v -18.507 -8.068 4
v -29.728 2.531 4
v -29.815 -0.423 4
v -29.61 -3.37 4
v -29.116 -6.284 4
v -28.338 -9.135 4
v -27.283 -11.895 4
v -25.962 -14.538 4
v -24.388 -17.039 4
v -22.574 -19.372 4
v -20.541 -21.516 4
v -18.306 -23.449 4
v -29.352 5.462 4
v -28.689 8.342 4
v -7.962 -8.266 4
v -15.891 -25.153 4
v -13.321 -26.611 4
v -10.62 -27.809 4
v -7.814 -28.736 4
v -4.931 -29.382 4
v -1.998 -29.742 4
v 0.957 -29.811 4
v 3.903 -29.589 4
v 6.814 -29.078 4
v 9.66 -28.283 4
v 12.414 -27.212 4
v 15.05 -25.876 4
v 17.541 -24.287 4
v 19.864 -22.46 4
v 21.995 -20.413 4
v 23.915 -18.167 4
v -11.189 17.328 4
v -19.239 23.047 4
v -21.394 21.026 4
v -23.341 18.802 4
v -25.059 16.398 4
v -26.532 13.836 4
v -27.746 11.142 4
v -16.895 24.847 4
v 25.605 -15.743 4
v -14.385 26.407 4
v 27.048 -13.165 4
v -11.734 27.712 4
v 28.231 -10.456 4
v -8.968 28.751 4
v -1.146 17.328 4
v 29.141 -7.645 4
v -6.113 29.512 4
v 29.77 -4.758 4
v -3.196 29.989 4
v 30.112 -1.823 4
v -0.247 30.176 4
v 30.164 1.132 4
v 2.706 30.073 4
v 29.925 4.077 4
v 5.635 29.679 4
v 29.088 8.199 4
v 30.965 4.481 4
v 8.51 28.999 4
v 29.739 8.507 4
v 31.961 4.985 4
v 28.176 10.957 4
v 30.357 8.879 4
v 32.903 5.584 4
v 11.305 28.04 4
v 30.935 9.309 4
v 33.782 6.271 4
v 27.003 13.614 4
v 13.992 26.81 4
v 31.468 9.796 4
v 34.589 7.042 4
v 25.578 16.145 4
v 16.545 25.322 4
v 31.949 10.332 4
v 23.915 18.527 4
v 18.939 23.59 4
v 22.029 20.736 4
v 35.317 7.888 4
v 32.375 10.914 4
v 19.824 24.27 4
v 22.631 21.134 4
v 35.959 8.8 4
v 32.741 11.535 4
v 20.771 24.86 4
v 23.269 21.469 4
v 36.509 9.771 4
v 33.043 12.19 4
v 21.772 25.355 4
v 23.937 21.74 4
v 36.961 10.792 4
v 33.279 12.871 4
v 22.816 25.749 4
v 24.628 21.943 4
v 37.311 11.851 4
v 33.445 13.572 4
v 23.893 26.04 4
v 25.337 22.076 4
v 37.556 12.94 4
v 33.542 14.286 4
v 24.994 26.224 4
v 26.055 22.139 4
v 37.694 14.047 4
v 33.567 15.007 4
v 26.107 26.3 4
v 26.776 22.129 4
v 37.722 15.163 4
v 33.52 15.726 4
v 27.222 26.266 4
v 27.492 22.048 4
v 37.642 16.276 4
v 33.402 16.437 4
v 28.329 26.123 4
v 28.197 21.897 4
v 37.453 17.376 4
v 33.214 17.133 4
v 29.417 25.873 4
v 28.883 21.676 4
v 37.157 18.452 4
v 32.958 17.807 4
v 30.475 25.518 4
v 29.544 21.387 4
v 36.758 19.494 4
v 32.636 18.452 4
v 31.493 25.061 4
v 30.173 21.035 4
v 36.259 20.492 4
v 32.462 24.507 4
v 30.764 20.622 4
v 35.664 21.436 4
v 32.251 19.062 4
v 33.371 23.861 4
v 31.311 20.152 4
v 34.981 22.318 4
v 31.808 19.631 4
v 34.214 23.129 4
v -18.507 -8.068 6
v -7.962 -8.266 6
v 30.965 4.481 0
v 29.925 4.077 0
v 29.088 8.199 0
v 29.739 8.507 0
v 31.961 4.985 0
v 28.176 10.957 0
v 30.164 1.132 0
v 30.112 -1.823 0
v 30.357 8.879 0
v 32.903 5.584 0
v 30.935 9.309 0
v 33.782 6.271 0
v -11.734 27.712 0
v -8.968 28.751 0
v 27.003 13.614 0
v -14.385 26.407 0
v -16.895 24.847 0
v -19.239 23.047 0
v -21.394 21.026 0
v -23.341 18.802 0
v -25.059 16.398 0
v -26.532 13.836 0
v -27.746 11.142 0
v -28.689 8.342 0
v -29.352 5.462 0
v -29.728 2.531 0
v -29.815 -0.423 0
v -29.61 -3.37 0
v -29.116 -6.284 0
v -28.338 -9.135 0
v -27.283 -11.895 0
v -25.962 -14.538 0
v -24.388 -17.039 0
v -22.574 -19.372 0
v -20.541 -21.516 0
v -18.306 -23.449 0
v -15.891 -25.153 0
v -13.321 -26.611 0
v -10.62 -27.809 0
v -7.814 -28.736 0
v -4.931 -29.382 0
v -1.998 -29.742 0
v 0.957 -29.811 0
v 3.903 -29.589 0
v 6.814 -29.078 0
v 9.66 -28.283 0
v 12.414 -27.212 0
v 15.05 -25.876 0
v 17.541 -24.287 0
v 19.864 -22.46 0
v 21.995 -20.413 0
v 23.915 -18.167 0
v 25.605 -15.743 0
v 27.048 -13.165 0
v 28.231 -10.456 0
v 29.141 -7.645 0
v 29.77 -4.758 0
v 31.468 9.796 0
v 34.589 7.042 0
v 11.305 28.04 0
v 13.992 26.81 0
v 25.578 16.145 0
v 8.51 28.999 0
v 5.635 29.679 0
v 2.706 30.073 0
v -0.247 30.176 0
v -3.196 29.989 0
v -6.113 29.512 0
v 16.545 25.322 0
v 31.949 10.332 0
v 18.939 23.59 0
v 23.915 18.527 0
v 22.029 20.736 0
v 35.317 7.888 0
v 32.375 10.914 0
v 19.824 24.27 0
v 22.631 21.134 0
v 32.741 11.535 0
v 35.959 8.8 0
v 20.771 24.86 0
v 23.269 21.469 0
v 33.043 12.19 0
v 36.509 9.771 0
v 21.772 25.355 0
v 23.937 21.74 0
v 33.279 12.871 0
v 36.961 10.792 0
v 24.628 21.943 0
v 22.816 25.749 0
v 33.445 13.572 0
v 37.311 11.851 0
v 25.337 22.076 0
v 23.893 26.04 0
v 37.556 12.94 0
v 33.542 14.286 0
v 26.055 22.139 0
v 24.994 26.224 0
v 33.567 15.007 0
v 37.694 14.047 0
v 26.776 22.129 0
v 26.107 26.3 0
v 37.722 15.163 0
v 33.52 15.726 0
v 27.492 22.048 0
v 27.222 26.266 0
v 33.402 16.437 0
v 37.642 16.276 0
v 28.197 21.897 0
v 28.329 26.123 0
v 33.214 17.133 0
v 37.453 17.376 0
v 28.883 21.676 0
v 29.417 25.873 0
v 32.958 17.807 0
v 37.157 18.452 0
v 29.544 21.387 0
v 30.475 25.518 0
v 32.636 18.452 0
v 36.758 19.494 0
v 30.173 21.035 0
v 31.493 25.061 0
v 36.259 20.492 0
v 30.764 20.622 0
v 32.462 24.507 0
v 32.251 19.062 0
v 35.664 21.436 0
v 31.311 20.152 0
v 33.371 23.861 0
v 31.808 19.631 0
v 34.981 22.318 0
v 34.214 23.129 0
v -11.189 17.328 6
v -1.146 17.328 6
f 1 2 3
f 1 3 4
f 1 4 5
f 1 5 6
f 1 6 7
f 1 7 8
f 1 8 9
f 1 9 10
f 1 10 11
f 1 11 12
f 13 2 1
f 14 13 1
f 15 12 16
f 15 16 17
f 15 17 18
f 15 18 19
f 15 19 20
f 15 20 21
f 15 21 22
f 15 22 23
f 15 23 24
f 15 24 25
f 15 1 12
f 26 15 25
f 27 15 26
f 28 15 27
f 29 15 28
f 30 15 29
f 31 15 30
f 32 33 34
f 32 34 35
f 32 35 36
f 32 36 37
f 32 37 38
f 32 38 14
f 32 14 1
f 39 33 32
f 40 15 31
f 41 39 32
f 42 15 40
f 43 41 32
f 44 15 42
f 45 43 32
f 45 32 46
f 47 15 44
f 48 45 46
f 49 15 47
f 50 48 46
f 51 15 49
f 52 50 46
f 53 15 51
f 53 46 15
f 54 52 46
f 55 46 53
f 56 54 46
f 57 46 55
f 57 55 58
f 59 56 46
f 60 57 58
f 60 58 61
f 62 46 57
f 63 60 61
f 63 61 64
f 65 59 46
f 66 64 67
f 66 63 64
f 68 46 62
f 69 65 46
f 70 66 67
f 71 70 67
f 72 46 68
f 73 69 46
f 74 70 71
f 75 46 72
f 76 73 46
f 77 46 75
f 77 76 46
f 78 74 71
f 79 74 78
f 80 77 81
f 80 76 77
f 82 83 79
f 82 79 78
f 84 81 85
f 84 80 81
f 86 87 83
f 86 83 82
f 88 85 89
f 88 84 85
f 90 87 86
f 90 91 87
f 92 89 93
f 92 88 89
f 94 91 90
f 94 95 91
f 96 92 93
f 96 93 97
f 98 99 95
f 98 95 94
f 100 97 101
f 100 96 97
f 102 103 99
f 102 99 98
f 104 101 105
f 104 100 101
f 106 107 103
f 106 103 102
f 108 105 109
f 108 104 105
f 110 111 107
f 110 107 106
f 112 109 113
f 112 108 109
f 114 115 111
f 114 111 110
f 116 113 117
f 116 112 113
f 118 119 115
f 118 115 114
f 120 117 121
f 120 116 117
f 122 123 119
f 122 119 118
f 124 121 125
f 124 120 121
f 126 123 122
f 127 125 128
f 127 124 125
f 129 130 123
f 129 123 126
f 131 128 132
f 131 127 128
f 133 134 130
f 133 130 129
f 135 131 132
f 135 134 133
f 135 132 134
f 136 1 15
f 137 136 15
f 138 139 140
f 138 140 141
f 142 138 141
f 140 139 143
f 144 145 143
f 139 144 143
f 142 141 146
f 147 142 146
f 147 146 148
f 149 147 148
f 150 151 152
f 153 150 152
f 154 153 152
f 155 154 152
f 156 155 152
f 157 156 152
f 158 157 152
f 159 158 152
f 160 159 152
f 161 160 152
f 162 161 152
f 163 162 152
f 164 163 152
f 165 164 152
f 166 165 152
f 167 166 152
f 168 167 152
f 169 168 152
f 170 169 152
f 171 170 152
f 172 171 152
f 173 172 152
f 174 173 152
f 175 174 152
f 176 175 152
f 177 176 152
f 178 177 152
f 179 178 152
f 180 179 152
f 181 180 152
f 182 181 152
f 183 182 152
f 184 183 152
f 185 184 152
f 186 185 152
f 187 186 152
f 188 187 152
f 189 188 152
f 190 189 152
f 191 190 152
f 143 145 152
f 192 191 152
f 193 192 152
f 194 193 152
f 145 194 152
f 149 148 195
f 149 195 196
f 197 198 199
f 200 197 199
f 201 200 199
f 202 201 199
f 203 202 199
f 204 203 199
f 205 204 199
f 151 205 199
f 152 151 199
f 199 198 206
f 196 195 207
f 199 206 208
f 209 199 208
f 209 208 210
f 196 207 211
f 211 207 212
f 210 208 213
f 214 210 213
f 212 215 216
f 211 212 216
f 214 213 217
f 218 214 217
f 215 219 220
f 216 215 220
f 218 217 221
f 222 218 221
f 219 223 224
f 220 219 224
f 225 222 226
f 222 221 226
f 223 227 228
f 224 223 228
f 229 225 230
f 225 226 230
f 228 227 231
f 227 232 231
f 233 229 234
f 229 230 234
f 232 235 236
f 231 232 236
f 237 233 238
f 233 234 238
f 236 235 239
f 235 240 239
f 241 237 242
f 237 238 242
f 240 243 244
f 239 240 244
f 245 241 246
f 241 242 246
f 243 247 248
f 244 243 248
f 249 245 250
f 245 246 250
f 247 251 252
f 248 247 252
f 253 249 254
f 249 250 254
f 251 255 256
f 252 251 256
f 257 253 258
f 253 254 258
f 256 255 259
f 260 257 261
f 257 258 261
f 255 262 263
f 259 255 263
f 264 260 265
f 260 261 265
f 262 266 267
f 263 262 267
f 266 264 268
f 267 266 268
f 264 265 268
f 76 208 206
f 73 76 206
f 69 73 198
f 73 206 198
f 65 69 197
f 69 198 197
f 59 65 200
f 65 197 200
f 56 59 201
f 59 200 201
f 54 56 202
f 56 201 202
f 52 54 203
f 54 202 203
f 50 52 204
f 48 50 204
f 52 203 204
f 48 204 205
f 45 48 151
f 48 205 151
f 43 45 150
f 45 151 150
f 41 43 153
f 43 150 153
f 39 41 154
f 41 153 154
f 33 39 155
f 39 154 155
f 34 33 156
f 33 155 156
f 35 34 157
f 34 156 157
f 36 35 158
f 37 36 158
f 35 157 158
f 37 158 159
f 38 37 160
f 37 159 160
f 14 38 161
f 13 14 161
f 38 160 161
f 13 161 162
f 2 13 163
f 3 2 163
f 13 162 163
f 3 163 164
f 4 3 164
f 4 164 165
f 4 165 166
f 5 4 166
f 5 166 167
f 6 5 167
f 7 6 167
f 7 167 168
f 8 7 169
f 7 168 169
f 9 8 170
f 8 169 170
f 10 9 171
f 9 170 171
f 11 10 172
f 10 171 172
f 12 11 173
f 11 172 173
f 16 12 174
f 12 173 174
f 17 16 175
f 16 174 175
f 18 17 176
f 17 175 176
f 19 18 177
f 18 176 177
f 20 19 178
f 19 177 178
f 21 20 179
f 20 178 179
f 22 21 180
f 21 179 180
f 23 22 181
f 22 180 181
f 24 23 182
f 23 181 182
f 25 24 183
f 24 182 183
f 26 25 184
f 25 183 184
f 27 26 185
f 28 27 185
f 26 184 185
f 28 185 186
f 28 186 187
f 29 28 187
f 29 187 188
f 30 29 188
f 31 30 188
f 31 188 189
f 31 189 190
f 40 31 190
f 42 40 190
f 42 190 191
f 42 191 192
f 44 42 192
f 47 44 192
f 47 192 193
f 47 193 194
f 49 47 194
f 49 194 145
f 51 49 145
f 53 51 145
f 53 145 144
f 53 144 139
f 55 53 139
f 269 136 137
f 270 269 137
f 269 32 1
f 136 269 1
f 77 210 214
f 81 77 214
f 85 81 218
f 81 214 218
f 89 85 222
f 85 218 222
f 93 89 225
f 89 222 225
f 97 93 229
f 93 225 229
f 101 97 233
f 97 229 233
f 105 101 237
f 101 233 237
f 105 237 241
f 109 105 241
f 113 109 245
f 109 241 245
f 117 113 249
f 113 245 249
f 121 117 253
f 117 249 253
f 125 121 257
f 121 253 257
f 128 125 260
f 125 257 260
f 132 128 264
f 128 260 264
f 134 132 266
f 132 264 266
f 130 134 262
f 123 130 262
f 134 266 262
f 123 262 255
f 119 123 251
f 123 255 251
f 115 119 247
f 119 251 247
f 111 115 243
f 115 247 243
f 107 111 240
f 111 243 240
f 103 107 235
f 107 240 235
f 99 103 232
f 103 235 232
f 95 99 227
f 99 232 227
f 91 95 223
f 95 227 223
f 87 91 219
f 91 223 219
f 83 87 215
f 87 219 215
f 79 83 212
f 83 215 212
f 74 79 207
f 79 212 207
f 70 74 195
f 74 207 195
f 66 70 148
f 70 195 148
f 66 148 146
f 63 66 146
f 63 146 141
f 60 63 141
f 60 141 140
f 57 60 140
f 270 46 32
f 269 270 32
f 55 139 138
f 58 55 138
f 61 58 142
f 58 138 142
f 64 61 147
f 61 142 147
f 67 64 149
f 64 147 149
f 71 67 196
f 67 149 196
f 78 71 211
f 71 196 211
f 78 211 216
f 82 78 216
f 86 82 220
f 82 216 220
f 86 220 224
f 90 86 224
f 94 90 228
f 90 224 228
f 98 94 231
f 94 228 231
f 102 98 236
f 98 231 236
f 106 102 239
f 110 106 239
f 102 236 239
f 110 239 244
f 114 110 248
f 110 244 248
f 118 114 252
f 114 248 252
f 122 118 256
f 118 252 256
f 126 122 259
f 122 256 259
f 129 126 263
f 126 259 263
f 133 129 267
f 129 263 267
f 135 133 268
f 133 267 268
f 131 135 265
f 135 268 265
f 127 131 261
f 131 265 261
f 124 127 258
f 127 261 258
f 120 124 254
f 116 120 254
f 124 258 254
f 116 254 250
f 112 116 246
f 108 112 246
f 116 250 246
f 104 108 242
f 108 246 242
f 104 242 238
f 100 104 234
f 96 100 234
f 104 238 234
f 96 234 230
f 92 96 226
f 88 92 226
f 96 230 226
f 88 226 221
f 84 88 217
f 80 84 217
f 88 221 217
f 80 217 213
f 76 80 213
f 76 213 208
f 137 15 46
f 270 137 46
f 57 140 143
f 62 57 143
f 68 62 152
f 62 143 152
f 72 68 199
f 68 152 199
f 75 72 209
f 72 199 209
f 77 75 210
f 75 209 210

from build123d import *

# Parameters (mm, degrees)
F1_DEPTH = 4
F3_DEPTH = 2


with BuildPart() as f1:
    # F0 (on Top) → F1 (new body)
    with BuildSketch(Plane.XY):
        with BuildLine():
            ThreePointArc((18.939283, 23.590199), (-25.962329, -14.538319), (29.925106, 4.077085))
            ThreePointArc((29.925106, 4.077085), (36.258822, 20.491997), (18.939283, 23.590199))
        make_face()
        with BuildLine():
            ThreePointArc((22.029397, 20.736062), (32.635662, 18.452168), (29.087509, 8.199382))
            ThreePointArc((29.087509, 8.199382), (26.321098, 14.897089), (22.029397, 20.736062))
        make_face(mode=Mode.SUBTRACT)
    extrude(amount=F1_DEPTH)

    # F2 (on face) → F3 (join)
    with BuildSketch(Plane.XY.offset(4)):
        Polygon((-11.189207, 17.327955), (-18.506745, -8.068205), (-7.962489, -8.2658), (-1.145528, 17.327955), align=None)
    extrude(amount=F3_DEPTH)


solid = f1.part
